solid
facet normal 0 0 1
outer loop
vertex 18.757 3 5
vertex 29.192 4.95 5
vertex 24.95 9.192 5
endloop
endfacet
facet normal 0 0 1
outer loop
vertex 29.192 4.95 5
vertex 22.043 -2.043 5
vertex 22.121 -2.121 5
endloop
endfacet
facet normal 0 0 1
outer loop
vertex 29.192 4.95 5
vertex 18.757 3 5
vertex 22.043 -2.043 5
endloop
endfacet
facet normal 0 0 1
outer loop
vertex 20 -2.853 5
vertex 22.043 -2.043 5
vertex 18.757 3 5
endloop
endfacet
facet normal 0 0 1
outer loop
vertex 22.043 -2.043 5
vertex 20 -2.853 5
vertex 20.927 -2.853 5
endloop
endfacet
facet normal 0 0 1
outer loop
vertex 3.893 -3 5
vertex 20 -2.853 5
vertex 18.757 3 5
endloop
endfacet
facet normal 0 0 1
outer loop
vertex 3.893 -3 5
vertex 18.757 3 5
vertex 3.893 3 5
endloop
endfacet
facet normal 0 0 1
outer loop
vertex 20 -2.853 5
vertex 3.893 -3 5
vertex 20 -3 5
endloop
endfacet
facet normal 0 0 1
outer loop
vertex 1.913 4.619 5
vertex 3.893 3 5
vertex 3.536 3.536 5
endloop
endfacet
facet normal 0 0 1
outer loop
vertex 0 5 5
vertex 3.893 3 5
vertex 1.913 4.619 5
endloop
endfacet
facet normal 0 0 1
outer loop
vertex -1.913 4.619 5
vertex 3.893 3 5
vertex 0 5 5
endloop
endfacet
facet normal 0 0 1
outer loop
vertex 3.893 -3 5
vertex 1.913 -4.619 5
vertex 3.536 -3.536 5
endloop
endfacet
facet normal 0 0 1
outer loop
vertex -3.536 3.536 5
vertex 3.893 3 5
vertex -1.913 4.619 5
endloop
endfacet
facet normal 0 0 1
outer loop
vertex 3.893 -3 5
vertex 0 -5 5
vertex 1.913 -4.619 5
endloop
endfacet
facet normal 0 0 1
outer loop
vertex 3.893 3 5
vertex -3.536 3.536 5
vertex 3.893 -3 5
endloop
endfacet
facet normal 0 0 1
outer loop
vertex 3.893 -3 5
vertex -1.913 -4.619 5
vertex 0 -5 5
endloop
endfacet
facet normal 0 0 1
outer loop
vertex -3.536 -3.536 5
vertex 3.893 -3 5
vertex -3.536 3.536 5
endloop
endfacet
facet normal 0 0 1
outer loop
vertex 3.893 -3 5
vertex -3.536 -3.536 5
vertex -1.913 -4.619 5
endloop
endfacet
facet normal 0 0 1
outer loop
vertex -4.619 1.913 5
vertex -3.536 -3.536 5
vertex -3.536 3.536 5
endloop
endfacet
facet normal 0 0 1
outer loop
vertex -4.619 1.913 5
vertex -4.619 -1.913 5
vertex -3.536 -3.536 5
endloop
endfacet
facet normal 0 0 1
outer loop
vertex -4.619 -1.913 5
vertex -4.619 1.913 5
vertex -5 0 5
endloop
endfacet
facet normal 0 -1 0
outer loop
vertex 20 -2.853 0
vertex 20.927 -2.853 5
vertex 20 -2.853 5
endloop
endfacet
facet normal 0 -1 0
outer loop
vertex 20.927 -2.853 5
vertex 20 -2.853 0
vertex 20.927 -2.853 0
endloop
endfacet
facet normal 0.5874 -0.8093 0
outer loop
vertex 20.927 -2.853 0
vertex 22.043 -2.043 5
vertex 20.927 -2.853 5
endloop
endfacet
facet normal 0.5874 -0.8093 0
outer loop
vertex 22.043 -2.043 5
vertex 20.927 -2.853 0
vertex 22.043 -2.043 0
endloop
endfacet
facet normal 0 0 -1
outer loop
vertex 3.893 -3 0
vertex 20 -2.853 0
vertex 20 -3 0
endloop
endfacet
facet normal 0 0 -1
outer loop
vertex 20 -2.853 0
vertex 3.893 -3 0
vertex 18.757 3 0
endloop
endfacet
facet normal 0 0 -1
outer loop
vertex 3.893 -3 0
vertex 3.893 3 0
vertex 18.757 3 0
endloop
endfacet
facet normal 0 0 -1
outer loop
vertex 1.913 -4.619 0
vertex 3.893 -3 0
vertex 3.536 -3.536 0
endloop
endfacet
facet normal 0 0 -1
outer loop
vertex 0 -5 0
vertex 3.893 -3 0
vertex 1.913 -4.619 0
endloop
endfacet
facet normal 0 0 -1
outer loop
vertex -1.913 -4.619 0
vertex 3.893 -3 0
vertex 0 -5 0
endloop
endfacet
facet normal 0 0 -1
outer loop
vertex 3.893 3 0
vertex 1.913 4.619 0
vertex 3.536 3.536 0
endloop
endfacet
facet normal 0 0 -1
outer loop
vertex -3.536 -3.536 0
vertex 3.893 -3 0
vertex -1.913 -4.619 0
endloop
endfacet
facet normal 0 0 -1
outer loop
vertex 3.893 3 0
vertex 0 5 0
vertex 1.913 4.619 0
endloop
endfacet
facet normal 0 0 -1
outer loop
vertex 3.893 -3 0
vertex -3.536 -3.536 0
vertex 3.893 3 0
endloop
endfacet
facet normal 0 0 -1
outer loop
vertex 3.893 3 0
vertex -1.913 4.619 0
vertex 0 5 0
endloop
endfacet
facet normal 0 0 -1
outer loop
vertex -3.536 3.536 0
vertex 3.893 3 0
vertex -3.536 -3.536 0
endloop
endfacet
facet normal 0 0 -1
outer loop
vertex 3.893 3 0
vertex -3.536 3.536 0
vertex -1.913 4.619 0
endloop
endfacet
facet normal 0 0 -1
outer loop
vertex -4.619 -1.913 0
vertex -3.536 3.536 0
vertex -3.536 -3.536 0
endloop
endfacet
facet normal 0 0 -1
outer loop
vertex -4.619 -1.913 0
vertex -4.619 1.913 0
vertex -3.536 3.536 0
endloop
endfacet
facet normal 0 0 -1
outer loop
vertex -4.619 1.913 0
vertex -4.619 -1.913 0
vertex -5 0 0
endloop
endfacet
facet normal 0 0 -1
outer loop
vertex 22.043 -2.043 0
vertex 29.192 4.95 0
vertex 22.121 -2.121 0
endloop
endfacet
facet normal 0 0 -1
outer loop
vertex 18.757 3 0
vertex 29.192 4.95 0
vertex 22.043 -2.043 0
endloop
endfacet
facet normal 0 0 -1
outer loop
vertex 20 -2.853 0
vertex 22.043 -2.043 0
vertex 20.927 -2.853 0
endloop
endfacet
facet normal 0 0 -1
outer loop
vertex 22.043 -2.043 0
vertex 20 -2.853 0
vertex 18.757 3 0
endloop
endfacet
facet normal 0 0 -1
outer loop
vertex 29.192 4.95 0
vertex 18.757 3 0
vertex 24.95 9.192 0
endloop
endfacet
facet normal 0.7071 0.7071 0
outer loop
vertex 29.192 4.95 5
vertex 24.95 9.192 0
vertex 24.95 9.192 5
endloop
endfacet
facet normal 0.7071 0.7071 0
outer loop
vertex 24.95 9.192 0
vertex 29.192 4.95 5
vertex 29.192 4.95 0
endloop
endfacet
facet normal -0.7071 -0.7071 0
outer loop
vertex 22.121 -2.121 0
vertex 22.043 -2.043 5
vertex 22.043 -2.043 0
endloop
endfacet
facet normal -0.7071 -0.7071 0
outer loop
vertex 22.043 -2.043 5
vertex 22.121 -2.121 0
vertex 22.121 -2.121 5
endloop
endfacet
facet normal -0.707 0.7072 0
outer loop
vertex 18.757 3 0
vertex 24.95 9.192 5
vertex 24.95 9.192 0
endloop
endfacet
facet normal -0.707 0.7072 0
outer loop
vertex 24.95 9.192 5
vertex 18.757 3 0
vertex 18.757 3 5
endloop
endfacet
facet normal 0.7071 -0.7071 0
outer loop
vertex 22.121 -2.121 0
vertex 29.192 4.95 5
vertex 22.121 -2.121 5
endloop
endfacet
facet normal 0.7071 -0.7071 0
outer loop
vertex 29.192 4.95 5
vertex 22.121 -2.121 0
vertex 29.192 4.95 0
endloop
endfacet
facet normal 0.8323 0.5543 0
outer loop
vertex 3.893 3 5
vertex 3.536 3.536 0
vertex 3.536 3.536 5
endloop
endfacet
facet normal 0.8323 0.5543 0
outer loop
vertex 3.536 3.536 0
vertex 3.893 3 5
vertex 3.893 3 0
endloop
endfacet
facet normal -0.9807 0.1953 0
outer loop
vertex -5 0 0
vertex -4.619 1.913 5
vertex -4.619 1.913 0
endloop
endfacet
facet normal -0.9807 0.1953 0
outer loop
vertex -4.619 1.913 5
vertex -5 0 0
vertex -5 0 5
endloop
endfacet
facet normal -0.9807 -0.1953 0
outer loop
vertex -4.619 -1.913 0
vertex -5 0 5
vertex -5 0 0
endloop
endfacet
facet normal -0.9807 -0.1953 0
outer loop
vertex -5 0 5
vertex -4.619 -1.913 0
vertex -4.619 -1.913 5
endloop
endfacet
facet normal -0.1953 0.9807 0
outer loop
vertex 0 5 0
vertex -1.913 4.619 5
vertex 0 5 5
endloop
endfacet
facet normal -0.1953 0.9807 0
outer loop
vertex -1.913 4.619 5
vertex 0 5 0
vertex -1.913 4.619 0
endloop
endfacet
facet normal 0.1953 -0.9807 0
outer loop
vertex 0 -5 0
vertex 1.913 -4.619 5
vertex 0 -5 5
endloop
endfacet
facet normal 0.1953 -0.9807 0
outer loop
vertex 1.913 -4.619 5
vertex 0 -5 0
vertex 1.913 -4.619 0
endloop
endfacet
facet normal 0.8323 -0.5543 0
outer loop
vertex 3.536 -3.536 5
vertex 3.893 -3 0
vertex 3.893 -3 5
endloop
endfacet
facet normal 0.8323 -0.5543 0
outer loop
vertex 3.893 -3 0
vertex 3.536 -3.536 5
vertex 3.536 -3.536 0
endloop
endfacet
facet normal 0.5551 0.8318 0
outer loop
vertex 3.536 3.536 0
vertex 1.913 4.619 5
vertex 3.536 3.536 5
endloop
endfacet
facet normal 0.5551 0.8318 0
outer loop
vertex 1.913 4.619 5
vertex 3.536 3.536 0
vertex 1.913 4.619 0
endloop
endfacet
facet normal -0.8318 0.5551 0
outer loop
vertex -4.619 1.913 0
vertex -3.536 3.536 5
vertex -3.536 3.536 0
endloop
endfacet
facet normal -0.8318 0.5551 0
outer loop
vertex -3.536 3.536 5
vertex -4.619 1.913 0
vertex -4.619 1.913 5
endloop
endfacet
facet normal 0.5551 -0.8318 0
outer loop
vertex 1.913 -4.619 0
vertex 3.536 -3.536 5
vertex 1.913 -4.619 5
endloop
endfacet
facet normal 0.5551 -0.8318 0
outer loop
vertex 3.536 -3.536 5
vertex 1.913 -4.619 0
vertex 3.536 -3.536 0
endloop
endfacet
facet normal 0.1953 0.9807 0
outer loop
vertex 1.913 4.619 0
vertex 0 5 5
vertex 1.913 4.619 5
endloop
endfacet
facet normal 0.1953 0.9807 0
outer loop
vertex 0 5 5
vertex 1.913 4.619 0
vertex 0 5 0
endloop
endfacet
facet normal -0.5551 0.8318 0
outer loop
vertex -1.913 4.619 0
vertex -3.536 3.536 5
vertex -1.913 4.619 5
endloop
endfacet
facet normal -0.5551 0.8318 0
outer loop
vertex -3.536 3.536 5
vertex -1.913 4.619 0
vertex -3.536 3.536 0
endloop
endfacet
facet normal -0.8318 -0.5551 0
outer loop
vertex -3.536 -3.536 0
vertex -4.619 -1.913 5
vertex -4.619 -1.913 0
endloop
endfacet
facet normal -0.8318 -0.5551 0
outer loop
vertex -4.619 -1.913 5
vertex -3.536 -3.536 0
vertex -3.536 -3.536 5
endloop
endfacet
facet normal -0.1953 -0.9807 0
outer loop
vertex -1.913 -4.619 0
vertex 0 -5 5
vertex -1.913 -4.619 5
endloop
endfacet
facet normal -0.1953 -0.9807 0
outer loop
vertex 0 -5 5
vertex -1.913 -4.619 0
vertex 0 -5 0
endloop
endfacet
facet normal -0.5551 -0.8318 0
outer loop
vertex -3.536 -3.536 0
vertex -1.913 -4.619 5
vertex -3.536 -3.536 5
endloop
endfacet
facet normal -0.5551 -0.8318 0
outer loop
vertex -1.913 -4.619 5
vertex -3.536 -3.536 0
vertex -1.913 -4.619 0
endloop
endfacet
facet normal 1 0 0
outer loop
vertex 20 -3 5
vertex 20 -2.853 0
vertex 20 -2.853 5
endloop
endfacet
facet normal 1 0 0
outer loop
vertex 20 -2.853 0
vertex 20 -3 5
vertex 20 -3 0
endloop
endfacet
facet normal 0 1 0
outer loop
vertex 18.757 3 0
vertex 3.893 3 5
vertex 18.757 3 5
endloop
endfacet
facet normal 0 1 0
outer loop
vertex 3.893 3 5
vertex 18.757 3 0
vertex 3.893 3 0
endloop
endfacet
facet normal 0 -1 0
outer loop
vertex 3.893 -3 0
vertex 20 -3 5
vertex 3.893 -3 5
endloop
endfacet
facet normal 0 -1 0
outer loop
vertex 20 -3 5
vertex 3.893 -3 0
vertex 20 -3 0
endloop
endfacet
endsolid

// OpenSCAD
module arm(height=5, shoulder_radius=5, elbow_radius=3, upper_arm_length=20, lower_arm_length=10, elbow_angle=45) {
    translate([0, 0, 0]) cylinder(h=height, r=shoulder_radius);
    translate([0, -elbow_radius, 0]) cube([upper_arm_length, 2 * elbow_radius, height]);
    translate([upper_arm_length, 0, 0]) {
        cylinder(h=height, r=elbow_radius);
        rotate(elbow_angle) translate([0, -elbow_radius, 0]) cube([lower_arm_length, 2 * elbow_radius, height]);
    }
}

arm();
